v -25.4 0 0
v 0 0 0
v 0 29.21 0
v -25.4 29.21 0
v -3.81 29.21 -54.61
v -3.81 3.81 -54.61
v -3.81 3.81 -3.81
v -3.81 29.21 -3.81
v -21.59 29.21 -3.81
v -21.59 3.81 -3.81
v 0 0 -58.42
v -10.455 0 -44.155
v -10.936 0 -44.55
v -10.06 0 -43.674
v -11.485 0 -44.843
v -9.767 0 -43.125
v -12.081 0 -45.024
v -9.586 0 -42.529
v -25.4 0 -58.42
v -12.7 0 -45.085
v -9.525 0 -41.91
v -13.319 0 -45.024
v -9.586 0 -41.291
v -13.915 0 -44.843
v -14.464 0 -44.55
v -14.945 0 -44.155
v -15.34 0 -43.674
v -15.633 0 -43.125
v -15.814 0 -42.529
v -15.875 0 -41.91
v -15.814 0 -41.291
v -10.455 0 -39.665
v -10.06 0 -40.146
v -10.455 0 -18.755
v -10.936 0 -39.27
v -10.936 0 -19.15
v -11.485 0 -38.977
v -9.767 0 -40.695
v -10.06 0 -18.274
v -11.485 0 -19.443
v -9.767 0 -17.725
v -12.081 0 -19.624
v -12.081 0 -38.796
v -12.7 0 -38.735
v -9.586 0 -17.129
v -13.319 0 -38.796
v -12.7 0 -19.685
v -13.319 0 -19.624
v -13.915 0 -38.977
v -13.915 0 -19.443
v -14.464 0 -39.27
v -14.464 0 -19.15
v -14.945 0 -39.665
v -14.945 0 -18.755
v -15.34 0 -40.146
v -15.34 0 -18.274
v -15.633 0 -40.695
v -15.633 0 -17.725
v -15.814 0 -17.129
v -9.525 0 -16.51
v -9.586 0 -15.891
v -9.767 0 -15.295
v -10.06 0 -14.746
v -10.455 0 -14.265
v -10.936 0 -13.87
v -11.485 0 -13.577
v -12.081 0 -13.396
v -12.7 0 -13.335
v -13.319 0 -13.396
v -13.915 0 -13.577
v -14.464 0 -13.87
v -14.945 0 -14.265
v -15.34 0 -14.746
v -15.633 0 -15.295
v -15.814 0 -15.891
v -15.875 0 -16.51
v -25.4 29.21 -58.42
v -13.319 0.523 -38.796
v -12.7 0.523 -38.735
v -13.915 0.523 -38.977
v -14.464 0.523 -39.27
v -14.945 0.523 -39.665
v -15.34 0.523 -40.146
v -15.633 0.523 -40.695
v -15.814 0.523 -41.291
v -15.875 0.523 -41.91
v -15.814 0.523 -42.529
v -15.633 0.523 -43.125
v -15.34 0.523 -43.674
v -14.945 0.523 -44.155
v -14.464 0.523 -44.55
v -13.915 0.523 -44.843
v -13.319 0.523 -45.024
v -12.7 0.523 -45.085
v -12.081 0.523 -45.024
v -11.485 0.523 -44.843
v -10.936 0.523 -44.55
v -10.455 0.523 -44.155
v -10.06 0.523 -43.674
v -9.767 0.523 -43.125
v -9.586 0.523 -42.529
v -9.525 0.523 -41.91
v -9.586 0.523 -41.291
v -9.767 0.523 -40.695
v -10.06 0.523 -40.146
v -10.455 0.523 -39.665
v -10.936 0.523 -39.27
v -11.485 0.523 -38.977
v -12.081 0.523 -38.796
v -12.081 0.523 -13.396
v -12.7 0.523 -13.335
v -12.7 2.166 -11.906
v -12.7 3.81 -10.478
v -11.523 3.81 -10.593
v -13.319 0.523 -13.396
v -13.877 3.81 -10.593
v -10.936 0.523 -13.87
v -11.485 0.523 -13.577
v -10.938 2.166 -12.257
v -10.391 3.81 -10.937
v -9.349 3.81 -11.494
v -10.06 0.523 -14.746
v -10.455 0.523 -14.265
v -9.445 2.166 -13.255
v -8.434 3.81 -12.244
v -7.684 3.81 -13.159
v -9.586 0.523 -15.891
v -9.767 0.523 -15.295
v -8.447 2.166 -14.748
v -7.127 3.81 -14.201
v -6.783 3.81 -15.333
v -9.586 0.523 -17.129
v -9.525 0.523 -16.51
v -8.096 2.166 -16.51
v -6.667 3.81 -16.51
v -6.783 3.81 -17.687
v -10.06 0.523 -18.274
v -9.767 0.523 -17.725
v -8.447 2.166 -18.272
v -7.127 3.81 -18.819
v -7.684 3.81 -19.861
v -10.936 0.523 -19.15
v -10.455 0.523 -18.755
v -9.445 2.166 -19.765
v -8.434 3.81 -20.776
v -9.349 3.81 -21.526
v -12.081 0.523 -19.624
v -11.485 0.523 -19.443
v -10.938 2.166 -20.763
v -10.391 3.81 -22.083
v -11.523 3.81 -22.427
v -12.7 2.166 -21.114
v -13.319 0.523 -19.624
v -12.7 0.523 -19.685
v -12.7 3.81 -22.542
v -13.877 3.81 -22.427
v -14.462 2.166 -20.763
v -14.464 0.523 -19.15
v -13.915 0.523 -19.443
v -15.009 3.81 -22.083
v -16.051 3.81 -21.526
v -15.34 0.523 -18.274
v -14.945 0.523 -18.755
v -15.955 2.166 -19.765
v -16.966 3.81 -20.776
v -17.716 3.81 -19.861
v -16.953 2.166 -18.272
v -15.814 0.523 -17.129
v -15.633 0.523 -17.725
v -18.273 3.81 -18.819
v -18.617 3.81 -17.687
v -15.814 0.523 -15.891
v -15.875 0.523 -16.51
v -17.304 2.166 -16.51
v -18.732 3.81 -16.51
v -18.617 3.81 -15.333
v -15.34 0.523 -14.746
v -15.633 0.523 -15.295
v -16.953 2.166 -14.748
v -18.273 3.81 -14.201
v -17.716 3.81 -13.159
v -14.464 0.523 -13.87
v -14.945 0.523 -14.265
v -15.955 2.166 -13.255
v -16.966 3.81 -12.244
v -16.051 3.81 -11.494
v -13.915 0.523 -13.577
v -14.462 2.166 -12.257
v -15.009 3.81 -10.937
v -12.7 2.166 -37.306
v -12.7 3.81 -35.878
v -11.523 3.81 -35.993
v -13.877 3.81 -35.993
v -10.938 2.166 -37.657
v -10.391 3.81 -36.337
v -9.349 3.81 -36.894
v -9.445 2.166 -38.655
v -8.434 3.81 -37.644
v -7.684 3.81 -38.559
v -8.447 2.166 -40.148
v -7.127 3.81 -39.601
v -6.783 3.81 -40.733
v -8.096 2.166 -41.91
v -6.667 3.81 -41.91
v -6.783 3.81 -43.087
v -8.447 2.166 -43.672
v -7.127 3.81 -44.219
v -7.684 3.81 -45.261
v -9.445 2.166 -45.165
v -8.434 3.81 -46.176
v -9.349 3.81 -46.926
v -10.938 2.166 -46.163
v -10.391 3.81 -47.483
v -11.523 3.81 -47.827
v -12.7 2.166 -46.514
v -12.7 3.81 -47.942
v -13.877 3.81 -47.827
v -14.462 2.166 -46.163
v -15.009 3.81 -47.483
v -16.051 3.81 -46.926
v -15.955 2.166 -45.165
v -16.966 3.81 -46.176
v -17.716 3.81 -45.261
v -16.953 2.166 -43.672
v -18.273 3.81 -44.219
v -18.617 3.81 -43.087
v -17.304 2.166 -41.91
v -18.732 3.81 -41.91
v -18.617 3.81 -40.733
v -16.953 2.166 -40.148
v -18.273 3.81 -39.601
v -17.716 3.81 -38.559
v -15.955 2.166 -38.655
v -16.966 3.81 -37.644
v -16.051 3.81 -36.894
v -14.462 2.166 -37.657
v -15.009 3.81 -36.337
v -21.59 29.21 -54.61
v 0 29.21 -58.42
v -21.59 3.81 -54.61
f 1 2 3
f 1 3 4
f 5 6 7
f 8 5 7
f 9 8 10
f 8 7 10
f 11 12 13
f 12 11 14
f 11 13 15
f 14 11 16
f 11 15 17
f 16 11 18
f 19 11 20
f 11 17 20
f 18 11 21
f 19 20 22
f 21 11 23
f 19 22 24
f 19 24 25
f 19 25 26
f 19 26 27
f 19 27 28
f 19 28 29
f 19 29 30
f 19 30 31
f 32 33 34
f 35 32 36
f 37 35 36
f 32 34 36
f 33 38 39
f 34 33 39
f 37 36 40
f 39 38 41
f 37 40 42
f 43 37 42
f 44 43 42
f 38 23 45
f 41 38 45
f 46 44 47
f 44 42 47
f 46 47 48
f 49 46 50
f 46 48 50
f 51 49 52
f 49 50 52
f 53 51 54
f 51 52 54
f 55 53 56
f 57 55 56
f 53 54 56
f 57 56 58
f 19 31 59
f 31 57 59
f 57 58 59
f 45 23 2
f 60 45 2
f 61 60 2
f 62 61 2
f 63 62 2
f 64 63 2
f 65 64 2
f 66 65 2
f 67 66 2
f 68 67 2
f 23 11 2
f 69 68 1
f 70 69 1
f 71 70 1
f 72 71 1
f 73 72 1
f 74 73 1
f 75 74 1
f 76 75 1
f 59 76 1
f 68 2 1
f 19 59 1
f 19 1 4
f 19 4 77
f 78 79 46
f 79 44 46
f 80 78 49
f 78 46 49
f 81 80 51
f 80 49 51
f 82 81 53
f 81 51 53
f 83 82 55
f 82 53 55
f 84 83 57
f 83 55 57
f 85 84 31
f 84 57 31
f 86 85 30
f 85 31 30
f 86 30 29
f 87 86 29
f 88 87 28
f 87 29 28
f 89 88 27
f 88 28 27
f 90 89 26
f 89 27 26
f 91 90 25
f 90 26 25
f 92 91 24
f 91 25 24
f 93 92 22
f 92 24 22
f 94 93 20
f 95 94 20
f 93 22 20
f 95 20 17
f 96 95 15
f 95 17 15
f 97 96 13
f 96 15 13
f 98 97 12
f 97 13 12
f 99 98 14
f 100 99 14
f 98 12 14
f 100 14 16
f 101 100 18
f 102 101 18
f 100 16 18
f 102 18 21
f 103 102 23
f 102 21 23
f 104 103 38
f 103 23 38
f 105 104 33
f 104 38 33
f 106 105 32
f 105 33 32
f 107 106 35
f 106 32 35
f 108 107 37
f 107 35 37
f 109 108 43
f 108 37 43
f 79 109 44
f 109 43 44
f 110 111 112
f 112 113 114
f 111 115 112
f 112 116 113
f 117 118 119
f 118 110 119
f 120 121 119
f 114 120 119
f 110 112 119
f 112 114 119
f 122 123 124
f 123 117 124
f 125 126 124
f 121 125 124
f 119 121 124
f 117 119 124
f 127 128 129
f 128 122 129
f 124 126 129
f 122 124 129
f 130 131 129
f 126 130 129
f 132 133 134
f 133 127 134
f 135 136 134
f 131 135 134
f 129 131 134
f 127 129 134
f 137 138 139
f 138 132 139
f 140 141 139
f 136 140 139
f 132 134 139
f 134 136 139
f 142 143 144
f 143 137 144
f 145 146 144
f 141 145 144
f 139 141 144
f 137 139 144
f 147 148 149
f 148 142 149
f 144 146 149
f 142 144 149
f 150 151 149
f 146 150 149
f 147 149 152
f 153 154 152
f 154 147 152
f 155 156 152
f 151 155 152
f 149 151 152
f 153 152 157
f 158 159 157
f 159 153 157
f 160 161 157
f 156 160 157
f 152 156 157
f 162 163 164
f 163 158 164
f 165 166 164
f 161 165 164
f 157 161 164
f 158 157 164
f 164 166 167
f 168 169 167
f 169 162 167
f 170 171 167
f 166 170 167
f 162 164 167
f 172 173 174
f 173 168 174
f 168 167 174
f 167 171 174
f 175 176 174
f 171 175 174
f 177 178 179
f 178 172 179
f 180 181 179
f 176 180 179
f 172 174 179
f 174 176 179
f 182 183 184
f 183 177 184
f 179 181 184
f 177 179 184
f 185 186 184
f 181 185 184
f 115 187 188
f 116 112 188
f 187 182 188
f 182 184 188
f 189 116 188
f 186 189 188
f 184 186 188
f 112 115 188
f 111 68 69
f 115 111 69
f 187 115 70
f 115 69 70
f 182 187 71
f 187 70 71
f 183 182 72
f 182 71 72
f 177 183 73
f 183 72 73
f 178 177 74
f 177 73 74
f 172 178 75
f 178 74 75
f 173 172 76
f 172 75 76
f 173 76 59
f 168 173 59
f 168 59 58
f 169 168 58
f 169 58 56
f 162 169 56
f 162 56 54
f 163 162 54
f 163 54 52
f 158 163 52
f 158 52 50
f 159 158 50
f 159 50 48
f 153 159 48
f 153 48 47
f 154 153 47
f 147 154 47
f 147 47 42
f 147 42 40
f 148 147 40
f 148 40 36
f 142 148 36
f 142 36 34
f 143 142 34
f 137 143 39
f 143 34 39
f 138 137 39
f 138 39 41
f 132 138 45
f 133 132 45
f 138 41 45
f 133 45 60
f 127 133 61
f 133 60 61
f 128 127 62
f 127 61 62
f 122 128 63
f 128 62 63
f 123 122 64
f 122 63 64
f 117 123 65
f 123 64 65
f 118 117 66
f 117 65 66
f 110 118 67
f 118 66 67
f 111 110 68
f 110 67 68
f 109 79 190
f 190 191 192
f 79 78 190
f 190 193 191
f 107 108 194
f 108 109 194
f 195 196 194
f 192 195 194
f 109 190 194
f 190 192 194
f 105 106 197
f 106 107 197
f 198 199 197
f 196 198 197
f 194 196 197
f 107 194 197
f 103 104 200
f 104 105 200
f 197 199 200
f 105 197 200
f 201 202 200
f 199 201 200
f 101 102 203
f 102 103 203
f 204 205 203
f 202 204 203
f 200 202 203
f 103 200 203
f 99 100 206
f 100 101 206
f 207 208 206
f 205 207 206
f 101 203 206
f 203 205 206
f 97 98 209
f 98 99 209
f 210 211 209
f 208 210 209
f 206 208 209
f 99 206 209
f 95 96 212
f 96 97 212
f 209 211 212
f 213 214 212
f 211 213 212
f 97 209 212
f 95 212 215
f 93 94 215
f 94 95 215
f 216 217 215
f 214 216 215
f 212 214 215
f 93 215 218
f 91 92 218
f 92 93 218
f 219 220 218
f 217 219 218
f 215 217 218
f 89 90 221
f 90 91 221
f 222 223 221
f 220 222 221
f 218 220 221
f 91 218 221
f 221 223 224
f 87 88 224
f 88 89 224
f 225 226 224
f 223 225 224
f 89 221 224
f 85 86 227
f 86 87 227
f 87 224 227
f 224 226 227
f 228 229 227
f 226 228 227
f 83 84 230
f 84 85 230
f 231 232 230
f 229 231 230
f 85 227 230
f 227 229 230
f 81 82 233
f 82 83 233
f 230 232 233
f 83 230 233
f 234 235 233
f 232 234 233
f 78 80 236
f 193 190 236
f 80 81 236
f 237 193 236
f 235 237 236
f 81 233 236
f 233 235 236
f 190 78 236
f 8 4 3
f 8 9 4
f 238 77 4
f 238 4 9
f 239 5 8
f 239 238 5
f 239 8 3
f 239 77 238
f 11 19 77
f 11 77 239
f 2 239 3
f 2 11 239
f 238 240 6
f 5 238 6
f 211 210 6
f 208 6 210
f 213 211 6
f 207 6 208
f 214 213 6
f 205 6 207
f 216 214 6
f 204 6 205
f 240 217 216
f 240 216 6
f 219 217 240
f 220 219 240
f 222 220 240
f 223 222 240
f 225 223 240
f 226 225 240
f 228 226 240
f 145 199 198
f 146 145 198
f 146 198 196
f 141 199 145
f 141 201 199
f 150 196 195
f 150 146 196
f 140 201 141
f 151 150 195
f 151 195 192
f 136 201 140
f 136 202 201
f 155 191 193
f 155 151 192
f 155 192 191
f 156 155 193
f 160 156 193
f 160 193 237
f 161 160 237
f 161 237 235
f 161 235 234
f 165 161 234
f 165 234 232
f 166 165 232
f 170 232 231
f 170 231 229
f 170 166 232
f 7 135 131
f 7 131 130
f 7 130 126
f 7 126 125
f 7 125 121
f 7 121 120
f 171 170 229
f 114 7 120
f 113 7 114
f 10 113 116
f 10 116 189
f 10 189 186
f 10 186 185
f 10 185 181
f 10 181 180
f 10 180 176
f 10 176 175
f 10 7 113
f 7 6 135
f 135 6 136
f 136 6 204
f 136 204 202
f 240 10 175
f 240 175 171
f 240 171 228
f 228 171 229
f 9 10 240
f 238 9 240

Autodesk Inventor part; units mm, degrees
ref_plane "YZ Plane" through (0, 0, 0) normal (1, 0, 0) x (0, 1, 0)
ref_plane "XZ Plane" through (0, 0, 0) normal (0, 1, 0) x (-1, 0, 0)
ref_plane "XY Plane" through (0, 0, 0) normal (0, 0, 1) x (1, 0, 0)
sketch "Sketch1" plane through (0, 0, 0) normal (0, 1, 0) x (-1, 0, 0)
  line L0 (0, 0) -> (25.4, 0)
  line L1 (25.4, 0) -> (25.4, -58.42)
  line L2 (25.4, -58.42) -> (0, -58.42)
  line L3 (0, -58.42) -> (0, 0)
  dimension "d0" = 25.4
  dimension "d1" = 58.42
extrude "Extrusion1" add sketch "Sketch1" along normal blind 3.81
sketch "Sketch2" plane through (0, 3.81, 0) normal (0, 1, 0) x (1, 0, 0)
  line L0 (-3.81, 3.81) -> (-21.59, 3.81)
  line L1 (-21.59, 3.81) -> (-21.59, 54.61)
  line L2 (-21.59, 54.61) -> (-3.81, 54.61)
  line L3 (-3.81, 54.61) -> (-3.81, 3.81)
  line L4 (-25.4, 58.42) -> (-25.4, 0) projected
  line L5 (-25.4, 0) -> (0, 0) projected
  line L6 (0, 0) -> (0, 58.42) projected
  line L7 (0, 58.42) -> (-25.4, 58.42) projected
  dimension "d4" = 17.78
  dimension "d5" = 50.8
extrude "Extrusion2" add sketch "Sketch2" along normal blind 25.4
sketch "Sketch3" plane through (0, 3.81, 0) normal (0, 1, 0) x (1, 0, 0)
  point P0 (0, 0)
  point P1 (-12.7, 16.51)
  point P2 (-12.7, 41.91)
hole "Hole1" at (-12.7, 3.81, -16.51) at (-12.7, 3.81, -41.91) direction (0, -1, 0) diameter 6.35 end through all countersink diameter 12.065 countersink angle 82
properties part number "batteryholder"
